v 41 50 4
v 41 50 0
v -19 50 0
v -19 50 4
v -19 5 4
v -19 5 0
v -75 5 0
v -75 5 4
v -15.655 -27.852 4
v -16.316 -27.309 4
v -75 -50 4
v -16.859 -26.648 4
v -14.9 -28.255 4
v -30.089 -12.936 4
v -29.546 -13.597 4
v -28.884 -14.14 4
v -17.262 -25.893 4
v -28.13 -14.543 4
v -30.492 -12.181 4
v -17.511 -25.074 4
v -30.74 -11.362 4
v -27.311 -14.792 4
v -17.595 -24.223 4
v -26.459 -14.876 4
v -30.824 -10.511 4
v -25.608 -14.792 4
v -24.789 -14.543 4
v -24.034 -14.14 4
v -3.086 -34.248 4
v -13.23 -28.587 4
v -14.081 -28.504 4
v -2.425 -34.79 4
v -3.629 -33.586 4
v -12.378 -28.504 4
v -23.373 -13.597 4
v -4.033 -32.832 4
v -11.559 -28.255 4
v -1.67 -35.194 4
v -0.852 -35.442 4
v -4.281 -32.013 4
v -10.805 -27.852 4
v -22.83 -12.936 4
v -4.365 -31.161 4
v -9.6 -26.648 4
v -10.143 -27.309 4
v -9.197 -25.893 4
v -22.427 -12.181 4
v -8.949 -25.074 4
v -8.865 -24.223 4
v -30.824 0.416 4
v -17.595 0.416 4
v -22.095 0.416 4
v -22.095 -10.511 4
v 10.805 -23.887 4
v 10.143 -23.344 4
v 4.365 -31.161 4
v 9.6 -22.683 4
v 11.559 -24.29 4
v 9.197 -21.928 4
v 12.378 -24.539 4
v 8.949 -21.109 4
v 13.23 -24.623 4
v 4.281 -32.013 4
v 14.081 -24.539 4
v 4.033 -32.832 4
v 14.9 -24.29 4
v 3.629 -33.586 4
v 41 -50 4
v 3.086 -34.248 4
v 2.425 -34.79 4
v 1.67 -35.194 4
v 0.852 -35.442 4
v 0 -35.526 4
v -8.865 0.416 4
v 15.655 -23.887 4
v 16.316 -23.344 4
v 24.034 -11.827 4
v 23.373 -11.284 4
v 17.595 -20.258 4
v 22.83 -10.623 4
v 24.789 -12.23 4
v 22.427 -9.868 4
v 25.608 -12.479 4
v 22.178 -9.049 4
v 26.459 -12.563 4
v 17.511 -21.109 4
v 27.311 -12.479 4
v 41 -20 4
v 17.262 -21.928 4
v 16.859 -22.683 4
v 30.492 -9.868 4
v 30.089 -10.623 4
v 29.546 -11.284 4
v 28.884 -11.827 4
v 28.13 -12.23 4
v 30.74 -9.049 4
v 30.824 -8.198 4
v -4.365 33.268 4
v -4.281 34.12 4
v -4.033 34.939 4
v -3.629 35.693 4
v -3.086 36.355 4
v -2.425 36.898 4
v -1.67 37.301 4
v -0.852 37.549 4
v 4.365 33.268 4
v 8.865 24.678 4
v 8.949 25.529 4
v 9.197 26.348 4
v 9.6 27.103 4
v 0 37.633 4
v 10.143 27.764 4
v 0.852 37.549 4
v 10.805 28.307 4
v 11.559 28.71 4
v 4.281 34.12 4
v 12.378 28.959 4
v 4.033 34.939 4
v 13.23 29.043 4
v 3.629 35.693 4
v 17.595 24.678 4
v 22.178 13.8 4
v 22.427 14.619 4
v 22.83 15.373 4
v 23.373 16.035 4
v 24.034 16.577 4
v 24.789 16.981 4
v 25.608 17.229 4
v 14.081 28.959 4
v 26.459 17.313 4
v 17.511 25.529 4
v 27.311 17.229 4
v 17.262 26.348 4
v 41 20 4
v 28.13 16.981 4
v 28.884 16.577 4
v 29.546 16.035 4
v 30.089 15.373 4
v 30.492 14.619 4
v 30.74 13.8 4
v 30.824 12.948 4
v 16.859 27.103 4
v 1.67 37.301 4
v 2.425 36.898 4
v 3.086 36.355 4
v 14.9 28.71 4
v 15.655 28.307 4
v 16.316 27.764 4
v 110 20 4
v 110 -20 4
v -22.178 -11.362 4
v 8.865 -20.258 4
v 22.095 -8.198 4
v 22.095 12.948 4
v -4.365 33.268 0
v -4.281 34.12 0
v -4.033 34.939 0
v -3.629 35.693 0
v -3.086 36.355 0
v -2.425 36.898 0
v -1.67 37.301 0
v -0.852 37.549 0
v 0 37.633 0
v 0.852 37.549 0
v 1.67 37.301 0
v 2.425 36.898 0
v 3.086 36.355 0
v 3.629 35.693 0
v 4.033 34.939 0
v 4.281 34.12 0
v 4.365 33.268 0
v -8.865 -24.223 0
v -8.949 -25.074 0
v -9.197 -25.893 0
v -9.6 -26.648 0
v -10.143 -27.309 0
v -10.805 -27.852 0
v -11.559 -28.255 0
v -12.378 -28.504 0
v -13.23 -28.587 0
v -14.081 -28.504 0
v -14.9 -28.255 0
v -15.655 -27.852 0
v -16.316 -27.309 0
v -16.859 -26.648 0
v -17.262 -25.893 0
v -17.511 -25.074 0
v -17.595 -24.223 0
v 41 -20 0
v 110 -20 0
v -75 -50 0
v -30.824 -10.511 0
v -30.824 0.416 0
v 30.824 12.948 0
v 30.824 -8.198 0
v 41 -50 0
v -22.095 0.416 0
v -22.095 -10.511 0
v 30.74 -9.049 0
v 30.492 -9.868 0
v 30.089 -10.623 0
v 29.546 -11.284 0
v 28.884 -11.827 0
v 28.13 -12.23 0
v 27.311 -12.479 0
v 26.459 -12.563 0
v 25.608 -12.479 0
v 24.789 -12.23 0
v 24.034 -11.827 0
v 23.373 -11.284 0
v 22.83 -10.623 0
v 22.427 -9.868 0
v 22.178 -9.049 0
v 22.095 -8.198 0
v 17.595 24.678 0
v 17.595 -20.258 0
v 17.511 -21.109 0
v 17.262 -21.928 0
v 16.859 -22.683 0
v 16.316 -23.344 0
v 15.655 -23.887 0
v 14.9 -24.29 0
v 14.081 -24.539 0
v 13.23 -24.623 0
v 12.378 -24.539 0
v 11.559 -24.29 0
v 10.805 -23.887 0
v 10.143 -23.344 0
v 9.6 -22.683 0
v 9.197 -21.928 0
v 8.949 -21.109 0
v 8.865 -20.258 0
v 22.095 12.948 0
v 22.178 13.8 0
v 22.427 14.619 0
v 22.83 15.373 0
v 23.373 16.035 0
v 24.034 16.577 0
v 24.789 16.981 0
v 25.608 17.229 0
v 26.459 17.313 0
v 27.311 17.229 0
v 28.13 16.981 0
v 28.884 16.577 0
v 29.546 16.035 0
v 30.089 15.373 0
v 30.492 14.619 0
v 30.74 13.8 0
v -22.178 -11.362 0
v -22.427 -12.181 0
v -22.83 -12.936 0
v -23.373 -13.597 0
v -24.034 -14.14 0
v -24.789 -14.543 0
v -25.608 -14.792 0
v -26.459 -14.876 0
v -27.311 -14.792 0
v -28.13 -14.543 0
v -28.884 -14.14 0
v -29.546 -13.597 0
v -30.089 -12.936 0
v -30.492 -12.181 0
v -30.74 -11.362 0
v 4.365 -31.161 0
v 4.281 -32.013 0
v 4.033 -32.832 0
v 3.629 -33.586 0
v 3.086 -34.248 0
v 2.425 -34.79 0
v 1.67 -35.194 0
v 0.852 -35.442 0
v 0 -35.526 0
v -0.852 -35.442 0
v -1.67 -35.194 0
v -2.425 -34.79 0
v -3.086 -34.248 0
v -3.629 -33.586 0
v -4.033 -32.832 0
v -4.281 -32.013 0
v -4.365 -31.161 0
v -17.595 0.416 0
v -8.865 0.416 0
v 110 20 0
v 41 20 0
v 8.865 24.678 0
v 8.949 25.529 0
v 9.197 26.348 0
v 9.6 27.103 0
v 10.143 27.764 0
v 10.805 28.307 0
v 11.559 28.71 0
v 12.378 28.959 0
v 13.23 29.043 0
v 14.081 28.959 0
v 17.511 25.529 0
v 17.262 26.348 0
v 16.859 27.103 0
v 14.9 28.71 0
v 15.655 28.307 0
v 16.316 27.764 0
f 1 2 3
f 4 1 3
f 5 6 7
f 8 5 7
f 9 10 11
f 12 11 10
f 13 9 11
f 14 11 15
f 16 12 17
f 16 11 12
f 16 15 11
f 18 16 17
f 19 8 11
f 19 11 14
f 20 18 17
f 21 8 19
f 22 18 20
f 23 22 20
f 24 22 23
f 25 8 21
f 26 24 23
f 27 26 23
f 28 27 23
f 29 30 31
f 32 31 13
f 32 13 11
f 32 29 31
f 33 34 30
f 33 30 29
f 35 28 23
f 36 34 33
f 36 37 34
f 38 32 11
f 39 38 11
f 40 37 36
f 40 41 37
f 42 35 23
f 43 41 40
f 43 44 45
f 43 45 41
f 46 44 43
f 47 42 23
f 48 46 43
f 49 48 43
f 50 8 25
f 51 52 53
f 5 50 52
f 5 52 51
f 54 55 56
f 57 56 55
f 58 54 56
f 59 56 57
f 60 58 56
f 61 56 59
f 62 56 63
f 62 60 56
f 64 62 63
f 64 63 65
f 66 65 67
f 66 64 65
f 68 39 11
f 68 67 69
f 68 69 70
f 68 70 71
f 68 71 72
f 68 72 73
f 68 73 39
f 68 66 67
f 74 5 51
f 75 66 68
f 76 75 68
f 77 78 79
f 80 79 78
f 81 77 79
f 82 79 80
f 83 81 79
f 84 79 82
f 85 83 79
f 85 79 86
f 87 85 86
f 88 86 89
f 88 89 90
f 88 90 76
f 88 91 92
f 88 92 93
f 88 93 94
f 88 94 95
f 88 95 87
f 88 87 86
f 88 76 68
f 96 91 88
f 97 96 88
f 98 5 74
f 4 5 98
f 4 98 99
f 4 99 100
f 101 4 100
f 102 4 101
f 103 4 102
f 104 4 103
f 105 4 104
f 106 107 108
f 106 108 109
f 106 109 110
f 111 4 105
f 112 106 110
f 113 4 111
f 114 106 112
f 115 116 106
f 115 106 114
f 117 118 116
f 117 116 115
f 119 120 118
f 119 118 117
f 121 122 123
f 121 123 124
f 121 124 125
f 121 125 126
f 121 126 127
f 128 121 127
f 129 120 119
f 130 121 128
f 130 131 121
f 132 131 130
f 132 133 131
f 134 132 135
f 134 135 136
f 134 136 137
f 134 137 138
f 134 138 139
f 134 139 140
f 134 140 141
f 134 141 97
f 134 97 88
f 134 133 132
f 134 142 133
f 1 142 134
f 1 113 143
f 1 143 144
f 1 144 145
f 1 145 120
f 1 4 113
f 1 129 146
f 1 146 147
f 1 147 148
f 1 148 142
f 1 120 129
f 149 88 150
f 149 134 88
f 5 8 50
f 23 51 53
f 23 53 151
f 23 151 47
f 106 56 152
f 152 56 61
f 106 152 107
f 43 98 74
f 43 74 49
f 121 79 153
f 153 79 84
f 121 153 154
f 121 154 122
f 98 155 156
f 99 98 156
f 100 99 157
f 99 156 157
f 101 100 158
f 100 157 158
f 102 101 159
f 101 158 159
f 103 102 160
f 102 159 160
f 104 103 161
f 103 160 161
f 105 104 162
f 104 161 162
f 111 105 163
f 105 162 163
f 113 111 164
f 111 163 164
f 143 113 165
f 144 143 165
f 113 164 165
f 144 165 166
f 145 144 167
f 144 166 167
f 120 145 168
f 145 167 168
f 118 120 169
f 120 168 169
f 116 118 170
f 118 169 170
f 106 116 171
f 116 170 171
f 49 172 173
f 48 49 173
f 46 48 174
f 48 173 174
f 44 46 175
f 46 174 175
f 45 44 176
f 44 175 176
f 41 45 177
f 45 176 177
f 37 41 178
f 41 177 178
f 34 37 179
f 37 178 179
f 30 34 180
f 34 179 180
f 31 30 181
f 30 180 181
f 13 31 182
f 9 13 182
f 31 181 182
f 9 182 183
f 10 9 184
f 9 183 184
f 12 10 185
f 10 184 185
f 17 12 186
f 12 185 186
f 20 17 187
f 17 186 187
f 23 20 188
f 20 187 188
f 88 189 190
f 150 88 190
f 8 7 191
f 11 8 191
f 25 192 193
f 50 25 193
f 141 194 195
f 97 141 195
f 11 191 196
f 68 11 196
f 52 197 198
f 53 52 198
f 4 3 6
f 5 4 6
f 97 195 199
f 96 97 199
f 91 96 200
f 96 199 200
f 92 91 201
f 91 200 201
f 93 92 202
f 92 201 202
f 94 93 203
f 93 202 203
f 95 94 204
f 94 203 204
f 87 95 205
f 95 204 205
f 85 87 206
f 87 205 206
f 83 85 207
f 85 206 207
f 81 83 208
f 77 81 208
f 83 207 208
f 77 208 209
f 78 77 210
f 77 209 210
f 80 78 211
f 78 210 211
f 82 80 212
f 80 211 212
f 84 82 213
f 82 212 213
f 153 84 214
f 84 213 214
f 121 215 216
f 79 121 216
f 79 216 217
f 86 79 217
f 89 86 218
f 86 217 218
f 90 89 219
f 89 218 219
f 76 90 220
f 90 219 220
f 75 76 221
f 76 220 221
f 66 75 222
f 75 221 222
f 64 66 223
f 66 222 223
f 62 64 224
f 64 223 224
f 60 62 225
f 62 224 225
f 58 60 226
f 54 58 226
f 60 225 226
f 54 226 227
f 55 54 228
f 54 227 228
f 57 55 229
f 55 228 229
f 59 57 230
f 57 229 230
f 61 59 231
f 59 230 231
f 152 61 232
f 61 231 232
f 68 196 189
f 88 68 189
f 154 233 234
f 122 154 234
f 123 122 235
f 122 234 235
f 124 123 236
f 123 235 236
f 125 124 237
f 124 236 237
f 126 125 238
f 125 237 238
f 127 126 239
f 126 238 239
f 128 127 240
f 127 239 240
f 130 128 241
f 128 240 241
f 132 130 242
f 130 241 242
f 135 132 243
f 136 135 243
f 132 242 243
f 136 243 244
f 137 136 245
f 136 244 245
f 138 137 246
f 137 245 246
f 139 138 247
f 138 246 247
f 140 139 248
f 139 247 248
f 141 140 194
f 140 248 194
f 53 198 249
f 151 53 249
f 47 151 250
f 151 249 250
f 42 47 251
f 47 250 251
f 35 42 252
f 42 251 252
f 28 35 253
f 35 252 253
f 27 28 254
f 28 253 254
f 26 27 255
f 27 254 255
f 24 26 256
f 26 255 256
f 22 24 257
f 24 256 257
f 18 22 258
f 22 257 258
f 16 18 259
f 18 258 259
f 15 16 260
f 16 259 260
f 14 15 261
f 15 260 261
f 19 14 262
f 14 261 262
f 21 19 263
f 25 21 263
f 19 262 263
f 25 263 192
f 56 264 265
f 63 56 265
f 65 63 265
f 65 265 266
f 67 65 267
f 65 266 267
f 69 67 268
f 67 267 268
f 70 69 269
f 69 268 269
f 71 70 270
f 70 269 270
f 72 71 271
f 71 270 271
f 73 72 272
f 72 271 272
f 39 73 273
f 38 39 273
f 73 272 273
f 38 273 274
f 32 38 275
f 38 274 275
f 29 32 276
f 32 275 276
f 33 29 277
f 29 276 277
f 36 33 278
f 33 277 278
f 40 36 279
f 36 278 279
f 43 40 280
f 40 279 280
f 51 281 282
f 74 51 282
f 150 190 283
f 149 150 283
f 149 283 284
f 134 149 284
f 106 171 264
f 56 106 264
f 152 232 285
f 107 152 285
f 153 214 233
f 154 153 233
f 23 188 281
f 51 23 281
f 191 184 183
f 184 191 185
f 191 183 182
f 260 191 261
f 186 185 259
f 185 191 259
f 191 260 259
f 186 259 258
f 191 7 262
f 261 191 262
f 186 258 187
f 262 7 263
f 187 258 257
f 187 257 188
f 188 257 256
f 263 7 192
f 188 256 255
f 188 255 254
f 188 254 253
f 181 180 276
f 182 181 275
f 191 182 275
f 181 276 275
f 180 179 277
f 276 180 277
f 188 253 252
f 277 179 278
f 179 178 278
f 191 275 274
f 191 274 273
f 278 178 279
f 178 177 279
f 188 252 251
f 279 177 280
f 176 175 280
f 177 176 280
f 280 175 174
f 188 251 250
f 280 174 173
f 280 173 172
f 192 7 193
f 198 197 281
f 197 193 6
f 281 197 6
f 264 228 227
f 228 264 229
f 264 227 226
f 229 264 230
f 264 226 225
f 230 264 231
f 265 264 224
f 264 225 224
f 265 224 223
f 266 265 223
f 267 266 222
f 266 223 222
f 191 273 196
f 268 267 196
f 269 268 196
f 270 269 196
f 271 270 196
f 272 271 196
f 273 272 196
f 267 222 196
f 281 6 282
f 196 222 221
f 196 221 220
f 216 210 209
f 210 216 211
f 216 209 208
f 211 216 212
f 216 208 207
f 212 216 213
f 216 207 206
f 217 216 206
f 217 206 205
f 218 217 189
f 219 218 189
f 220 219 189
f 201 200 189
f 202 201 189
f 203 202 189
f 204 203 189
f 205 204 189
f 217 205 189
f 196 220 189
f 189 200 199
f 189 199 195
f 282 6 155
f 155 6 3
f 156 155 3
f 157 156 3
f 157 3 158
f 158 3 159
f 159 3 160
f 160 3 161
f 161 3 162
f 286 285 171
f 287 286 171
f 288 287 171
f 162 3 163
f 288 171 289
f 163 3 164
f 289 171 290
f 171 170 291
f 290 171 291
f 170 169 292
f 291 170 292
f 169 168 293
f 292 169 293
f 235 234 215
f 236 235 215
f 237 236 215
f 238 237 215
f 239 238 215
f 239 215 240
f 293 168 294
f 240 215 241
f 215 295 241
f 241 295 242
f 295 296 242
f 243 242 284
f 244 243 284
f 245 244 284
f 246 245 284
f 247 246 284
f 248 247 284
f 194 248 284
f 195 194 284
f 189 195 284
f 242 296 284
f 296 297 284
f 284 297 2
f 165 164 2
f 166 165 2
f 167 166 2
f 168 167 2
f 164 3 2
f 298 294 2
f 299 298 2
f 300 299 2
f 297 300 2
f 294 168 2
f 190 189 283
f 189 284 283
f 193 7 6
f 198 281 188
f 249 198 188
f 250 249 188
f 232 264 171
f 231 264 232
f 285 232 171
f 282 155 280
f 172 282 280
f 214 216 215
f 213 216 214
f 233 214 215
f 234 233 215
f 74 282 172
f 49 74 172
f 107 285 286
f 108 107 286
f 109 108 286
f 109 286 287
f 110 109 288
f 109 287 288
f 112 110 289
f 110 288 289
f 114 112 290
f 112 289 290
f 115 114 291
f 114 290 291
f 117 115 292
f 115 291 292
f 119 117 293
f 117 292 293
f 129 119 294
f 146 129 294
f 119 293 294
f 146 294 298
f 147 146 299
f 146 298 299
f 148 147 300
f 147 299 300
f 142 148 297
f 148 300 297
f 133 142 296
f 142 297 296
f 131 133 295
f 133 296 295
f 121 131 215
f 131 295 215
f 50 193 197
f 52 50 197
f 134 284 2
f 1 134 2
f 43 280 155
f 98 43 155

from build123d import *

# Parameters (mm, degrees)
BOSS_EXTRUDE1_DEPTH = 4


with BuildPart() as part:
    # Sketch1 → Boss-Extrude1 (new body)
    with BuildSketch(Plane.XY):
        Polygon((-19, 50), (-19, 5), (-75, 5), (-75, -50), (41, -50), (41, -20), (110, -20), (110, 20), (41, 20), (41, 50), align=None)
        with BuildLine():
            Line((4.364841143, 33.268336331), (4.364841143, -31.161160072))
            ThreePointArc((4.364841143, -31.161160072), (0, -35.526001215), (-4.364841143, -31.161160072))
            Line((-4.364841143, -31.161160072), (-4.364841143, 33.268336331))
            ThreePointArc((-4.364841143, 33.268336331), (0, 37.633177474), (4.364841143, 33.268336331))
        make_face(mode=Mode.SUBTRACT)
        with BuildLine():
            Line((17.594523423, 24.677736811), (17.594523423, -20.257706835))
            ThreePointArc((17.594523423, -20.257706835), (13.229682283, -24.622547975), (8.864841143, -20.257706835))
            Line((8.864841143, -20.257706835), (8.864841143, 24.677736811))
            ThreePointArc((8.864841143, 24.677736811), (13.229682283, 29.042577951), (17.594523423, 24.677736811))
        make_face(mode=Mode.SUBTRACT)
        with BuildLine():
            Line((30.824205703, 12.948264388), (30.824205703, -8.197826739))
            ThreePointArc((30.824205703, -8.197826739), (26.459364563, -12.562667879), (22.094523423, -8.197826739))
            Line((22.094523423, -8.197826739), (22.094523423, 12.948264388))
            ThreePointArc((22.094523423, 12.948264388), (26.459364563, 17.313105528), (30.824205703, 12.948264388))
        make_face(mode=Mode.SUBTRACT)
        with BuildLine():
            Line((-30.824205703, 0.416133702), (-22.094523423, 0.416133702))
            Line((-22.094523423, 0.416133702), (-22.094523423, -10.510680456))
            ThreePointArc((-22.094523423, -10.510680456), (-26.459364563, -14.875521596), (-30.824205703, -10.510680456))
            Line((-30.824205703, -10.510680456), (-30.824205703, 0.416133702))
        make_face(mode=Mode.SUBTRACT)
        with BuildLine():
            Line((-17.594523423, 0.416133702), (-8.864841143, 0.416133702))
            Line((-8.864841143, 0.416133702), (-8.864841143, -24.222598921))
            ThreePointArc((-8.864841143, -24.222598921), (-13.229682283, -28.587440061), (-17.594523423, -24.222598921))
            Line((-17.594523423, -24.222598921), (-17.594523423, 0.416133702))
        make_face(mode=Mode.SUBTRACT)
    extrude(amount=BOSS_EXTRUDE1_DEPTH)


solid = part.part
